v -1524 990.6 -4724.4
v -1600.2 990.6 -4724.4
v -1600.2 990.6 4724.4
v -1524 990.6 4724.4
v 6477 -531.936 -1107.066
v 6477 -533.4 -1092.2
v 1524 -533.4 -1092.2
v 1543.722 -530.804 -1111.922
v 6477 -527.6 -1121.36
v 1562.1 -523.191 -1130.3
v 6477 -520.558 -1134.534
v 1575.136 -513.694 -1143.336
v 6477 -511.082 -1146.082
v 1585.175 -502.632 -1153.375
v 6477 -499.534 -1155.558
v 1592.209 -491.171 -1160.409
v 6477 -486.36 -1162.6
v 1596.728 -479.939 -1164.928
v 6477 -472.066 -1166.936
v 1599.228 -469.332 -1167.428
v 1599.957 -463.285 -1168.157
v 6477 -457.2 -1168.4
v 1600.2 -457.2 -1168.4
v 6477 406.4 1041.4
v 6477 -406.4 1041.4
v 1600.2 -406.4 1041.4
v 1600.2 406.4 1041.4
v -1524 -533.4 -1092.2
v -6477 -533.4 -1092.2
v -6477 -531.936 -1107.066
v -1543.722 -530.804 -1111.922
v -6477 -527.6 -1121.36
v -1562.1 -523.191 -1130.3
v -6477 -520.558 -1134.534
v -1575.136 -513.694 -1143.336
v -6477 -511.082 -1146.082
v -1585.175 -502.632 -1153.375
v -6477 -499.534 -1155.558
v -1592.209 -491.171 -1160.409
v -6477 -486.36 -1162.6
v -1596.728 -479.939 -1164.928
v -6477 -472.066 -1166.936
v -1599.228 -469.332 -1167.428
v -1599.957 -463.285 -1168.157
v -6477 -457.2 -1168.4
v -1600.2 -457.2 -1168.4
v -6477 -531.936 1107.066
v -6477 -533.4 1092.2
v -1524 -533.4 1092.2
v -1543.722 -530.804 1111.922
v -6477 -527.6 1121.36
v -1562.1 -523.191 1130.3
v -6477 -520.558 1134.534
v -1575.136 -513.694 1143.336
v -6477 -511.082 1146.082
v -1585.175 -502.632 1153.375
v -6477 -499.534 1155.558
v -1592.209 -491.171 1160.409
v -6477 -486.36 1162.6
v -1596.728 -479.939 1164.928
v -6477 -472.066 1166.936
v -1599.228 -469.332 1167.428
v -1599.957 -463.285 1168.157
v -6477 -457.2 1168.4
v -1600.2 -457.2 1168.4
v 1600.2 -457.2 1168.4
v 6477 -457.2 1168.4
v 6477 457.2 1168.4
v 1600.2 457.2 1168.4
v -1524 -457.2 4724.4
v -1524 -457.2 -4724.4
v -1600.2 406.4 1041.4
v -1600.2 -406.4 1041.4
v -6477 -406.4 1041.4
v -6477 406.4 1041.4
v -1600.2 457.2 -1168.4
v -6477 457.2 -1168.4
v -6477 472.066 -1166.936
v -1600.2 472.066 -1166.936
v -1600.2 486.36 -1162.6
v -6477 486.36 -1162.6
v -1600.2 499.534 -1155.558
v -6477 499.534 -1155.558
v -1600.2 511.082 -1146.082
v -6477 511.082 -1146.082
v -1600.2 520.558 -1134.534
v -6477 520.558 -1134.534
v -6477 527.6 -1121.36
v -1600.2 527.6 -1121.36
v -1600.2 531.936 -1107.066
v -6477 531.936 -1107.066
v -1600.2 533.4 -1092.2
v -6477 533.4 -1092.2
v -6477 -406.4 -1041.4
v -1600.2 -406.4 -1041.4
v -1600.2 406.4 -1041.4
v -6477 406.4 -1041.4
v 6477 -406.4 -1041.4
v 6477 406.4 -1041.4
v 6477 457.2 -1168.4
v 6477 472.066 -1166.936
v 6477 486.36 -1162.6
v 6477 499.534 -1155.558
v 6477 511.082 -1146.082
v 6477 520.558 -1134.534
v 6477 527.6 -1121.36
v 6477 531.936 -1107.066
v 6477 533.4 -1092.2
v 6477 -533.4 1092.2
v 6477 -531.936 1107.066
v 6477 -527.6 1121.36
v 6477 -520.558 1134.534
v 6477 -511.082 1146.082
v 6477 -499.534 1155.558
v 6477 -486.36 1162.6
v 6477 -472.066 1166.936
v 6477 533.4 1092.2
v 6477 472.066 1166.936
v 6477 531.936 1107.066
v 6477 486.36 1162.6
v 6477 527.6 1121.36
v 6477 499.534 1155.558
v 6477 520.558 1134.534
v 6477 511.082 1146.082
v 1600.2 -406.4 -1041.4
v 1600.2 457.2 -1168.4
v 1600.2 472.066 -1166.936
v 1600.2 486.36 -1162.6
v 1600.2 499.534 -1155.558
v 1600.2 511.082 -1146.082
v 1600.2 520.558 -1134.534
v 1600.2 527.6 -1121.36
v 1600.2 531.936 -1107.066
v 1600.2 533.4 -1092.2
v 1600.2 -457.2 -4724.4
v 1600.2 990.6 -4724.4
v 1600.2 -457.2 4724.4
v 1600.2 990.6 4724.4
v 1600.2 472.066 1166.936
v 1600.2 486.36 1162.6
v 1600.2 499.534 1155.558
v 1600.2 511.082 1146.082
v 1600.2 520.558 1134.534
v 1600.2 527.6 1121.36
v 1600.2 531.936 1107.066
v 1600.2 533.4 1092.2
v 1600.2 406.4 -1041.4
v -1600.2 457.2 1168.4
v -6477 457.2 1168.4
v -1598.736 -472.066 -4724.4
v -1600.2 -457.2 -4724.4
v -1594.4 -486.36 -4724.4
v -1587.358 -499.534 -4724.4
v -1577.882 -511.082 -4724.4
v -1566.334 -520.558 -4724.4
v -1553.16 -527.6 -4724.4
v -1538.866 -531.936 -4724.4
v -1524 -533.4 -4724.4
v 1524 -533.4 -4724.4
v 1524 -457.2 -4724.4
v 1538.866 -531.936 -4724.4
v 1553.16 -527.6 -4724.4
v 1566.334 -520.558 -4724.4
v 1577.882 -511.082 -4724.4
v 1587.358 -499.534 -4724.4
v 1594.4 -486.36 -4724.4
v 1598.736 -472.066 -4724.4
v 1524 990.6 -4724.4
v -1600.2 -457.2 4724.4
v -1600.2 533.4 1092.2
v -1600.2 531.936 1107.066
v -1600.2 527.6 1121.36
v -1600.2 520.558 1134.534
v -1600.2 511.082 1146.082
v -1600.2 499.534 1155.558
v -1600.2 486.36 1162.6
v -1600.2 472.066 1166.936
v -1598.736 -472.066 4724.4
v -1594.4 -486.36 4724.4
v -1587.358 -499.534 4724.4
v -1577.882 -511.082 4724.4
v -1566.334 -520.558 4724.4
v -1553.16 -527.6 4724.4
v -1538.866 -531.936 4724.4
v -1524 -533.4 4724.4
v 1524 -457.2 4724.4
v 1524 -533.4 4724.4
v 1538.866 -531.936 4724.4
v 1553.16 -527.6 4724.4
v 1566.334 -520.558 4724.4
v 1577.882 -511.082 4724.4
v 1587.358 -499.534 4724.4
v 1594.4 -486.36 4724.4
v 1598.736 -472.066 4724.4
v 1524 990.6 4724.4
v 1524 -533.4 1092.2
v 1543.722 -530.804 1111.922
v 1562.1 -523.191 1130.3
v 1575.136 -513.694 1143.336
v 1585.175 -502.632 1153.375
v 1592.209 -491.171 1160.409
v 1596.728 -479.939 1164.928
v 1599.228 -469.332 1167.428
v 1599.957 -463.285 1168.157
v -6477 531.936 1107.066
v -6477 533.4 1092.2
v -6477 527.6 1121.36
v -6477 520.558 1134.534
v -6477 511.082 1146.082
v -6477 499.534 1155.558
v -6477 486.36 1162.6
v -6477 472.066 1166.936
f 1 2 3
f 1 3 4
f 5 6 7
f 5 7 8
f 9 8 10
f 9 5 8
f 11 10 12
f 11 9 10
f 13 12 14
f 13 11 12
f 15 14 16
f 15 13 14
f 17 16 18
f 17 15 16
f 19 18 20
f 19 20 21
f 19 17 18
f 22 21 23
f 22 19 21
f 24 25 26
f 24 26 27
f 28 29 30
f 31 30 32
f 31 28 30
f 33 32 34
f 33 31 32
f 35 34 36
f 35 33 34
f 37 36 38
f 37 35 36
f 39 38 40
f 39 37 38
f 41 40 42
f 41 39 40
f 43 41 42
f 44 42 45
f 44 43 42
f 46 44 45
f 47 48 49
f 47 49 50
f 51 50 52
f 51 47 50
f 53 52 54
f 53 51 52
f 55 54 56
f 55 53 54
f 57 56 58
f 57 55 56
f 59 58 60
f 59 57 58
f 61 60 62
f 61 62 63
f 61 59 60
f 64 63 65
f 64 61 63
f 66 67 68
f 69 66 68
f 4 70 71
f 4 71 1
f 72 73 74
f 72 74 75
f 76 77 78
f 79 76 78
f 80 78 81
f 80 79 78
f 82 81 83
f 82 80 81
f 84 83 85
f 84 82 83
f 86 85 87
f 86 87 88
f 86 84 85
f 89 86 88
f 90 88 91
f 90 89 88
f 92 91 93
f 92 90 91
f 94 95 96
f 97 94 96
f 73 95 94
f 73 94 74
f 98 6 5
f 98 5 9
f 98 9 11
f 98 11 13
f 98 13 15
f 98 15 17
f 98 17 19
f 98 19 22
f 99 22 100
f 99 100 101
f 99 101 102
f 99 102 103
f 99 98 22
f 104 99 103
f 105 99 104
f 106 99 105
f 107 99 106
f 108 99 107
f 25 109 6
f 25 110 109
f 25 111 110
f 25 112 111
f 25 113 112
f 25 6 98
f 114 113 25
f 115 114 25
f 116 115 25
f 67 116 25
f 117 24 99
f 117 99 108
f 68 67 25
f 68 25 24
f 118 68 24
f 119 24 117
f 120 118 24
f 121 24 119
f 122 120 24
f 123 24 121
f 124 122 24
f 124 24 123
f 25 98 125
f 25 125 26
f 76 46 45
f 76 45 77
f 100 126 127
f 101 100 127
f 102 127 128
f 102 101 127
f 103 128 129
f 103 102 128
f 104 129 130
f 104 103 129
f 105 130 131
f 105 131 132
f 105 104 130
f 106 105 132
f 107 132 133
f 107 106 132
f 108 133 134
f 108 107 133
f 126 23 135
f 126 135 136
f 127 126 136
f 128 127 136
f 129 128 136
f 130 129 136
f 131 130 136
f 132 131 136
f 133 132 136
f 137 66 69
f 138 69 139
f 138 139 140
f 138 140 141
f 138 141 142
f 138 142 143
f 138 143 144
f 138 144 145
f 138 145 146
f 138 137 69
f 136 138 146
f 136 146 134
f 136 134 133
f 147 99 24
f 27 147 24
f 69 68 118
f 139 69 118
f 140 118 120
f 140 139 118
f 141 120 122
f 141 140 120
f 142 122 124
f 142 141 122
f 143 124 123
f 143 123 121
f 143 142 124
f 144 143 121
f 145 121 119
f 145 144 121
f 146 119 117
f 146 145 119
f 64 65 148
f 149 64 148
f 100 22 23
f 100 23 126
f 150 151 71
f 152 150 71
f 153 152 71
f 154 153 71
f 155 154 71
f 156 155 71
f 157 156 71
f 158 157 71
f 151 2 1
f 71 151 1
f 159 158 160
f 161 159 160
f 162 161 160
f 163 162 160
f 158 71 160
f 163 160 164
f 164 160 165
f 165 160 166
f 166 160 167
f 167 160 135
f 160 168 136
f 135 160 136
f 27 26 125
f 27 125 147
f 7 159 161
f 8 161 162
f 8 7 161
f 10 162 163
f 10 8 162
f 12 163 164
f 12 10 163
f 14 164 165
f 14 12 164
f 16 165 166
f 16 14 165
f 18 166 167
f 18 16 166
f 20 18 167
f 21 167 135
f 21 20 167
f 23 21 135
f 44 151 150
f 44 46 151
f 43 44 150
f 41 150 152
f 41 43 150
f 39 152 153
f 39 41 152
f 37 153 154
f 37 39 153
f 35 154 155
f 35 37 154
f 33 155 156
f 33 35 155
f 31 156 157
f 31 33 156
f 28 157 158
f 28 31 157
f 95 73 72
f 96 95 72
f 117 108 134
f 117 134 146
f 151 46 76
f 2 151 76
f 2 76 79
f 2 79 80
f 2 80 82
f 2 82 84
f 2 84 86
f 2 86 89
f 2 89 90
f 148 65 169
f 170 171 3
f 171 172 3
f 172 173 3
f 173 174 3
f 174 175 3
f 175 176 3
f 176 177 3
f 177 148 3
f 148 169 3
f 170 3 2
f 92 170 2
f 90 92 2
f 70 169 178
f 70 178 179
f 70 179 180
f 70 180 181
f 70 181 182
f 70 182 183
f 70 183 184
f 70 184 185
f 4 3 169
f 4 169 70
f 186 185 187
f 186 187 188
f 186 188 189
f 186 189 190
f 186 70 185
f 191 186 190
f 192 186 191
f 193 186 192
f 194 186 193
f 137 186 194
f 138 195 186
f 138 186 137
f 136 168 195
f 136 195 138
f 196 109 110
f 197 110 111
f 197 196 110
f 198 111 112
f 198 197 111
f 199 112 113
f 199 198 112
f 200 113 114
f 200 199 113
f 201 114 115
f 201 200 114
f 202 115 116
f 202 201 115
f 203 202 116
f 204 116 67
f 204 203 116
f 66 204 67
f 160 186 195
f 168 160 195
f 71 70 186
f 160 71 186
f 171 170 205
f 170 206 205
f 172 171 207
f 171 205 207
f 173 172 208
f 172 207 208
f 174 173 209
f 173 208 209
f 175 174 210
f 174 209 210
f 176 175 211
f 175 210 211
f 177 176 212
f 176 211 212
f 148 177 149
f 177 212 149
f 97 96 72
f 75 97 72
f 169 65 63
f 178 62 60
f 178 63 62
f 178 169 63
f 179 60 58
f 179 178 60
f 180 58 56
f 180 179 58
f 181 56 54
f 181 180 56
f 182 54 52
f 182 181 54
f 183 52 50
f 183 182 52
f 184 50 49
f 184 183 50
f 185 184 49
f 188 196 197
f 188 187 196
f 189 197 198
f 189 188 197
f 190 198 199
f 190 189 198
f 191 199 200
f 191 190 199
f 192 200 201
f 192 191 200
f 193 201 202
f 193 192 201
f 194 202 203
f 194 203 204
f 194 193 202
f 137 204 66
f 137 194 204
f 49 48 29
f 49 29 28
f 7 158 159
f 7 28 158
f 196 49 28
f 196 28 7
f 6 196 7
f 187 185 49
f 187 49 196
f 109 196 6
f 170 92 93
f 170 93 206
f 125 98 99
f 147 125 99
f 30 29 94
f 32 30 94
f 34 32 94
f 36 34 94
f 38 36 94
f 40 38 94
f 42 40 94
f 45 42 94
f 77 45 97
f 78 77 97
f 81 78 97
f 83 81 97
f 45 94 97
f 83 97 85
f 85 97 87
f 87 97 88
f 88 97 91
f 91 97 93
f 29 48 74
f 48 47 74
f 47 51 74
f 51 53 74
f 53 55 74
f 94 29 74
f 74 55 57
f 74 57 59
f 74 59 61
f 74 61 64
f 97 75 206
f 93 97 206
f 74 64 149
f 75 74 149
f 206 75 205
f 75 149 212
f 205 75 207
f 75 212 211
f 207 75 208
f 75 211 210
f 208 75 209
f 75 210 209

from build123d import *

# Parameters (mm, degrees)
F0_W     = 1066.8
F0_H     = 2336.8
F0_W_2   = 812.8
F0_H_2   = 2082.8
F1_DEPTH = 6477
F2_W     = 3200.4
F2_H     = 1524
F3_DEPTH = 4724.4
F4_W     = 3048
F4_H     = 1447.8
F5_DEPTH = 9448.8
F6_R     = 76.2


with BuildPart() as f1:
    # F0 (on Right) → F1 (new body, symmetric)
    with BuildSketch(Plane.YZ):
        Rectangle(F0_W, F0_H)
        Rectangle(F0_W_2, F0_H_2, mode=Mode.SUBTRACT)
    extrude(amount=F1_DEPTH, both=True)

    # F2 (on Top) → F3 (join, symmetric)
    with BuildSketch(Plane.XY):
        with Locations((0, 228.6)):
            Rectangle(F2_W, F2_H)
    extrude(amount=F3_DEPTH, both=True)

    # F4 (on face) → F5 (cut)
    with BuildSketch(Plane.XY.offset(4724.4)):
        with Locations((0, 266.7)):
            Rectangle(F4_W, F4_H)
    extrude(amount=-F5_DEPTH, mode=Mode.SUBTRACT)

    # F6
    f6_edges = [f1.edges().sort_by_distance(p)[0] for p in [
        (-4038.6, -533.4, 1168.4),
        (4038.6, -533.4, 1168.4),
        (-4038.6, -533.4, -1168.4),
        (4038.6, -533.4, -1168.4),
        (-1600.2, -533.4, 2946.4),
        (-1600.2, -533.4, -2946.4),
        (1600.2, -533.4, -2946.4),
        (1600.2, -533.4, 2946.4),
        (-4038.6, 533.4, 1168.4),
        (4038.6, 533.4, 1168.4),
        (-4038.6, 533.4, -1168.4),
        (4038.6, 533.4, -1168.4),
    ]]
    fillet(f6_edges, radius=F6_R)


solid = f1.part
